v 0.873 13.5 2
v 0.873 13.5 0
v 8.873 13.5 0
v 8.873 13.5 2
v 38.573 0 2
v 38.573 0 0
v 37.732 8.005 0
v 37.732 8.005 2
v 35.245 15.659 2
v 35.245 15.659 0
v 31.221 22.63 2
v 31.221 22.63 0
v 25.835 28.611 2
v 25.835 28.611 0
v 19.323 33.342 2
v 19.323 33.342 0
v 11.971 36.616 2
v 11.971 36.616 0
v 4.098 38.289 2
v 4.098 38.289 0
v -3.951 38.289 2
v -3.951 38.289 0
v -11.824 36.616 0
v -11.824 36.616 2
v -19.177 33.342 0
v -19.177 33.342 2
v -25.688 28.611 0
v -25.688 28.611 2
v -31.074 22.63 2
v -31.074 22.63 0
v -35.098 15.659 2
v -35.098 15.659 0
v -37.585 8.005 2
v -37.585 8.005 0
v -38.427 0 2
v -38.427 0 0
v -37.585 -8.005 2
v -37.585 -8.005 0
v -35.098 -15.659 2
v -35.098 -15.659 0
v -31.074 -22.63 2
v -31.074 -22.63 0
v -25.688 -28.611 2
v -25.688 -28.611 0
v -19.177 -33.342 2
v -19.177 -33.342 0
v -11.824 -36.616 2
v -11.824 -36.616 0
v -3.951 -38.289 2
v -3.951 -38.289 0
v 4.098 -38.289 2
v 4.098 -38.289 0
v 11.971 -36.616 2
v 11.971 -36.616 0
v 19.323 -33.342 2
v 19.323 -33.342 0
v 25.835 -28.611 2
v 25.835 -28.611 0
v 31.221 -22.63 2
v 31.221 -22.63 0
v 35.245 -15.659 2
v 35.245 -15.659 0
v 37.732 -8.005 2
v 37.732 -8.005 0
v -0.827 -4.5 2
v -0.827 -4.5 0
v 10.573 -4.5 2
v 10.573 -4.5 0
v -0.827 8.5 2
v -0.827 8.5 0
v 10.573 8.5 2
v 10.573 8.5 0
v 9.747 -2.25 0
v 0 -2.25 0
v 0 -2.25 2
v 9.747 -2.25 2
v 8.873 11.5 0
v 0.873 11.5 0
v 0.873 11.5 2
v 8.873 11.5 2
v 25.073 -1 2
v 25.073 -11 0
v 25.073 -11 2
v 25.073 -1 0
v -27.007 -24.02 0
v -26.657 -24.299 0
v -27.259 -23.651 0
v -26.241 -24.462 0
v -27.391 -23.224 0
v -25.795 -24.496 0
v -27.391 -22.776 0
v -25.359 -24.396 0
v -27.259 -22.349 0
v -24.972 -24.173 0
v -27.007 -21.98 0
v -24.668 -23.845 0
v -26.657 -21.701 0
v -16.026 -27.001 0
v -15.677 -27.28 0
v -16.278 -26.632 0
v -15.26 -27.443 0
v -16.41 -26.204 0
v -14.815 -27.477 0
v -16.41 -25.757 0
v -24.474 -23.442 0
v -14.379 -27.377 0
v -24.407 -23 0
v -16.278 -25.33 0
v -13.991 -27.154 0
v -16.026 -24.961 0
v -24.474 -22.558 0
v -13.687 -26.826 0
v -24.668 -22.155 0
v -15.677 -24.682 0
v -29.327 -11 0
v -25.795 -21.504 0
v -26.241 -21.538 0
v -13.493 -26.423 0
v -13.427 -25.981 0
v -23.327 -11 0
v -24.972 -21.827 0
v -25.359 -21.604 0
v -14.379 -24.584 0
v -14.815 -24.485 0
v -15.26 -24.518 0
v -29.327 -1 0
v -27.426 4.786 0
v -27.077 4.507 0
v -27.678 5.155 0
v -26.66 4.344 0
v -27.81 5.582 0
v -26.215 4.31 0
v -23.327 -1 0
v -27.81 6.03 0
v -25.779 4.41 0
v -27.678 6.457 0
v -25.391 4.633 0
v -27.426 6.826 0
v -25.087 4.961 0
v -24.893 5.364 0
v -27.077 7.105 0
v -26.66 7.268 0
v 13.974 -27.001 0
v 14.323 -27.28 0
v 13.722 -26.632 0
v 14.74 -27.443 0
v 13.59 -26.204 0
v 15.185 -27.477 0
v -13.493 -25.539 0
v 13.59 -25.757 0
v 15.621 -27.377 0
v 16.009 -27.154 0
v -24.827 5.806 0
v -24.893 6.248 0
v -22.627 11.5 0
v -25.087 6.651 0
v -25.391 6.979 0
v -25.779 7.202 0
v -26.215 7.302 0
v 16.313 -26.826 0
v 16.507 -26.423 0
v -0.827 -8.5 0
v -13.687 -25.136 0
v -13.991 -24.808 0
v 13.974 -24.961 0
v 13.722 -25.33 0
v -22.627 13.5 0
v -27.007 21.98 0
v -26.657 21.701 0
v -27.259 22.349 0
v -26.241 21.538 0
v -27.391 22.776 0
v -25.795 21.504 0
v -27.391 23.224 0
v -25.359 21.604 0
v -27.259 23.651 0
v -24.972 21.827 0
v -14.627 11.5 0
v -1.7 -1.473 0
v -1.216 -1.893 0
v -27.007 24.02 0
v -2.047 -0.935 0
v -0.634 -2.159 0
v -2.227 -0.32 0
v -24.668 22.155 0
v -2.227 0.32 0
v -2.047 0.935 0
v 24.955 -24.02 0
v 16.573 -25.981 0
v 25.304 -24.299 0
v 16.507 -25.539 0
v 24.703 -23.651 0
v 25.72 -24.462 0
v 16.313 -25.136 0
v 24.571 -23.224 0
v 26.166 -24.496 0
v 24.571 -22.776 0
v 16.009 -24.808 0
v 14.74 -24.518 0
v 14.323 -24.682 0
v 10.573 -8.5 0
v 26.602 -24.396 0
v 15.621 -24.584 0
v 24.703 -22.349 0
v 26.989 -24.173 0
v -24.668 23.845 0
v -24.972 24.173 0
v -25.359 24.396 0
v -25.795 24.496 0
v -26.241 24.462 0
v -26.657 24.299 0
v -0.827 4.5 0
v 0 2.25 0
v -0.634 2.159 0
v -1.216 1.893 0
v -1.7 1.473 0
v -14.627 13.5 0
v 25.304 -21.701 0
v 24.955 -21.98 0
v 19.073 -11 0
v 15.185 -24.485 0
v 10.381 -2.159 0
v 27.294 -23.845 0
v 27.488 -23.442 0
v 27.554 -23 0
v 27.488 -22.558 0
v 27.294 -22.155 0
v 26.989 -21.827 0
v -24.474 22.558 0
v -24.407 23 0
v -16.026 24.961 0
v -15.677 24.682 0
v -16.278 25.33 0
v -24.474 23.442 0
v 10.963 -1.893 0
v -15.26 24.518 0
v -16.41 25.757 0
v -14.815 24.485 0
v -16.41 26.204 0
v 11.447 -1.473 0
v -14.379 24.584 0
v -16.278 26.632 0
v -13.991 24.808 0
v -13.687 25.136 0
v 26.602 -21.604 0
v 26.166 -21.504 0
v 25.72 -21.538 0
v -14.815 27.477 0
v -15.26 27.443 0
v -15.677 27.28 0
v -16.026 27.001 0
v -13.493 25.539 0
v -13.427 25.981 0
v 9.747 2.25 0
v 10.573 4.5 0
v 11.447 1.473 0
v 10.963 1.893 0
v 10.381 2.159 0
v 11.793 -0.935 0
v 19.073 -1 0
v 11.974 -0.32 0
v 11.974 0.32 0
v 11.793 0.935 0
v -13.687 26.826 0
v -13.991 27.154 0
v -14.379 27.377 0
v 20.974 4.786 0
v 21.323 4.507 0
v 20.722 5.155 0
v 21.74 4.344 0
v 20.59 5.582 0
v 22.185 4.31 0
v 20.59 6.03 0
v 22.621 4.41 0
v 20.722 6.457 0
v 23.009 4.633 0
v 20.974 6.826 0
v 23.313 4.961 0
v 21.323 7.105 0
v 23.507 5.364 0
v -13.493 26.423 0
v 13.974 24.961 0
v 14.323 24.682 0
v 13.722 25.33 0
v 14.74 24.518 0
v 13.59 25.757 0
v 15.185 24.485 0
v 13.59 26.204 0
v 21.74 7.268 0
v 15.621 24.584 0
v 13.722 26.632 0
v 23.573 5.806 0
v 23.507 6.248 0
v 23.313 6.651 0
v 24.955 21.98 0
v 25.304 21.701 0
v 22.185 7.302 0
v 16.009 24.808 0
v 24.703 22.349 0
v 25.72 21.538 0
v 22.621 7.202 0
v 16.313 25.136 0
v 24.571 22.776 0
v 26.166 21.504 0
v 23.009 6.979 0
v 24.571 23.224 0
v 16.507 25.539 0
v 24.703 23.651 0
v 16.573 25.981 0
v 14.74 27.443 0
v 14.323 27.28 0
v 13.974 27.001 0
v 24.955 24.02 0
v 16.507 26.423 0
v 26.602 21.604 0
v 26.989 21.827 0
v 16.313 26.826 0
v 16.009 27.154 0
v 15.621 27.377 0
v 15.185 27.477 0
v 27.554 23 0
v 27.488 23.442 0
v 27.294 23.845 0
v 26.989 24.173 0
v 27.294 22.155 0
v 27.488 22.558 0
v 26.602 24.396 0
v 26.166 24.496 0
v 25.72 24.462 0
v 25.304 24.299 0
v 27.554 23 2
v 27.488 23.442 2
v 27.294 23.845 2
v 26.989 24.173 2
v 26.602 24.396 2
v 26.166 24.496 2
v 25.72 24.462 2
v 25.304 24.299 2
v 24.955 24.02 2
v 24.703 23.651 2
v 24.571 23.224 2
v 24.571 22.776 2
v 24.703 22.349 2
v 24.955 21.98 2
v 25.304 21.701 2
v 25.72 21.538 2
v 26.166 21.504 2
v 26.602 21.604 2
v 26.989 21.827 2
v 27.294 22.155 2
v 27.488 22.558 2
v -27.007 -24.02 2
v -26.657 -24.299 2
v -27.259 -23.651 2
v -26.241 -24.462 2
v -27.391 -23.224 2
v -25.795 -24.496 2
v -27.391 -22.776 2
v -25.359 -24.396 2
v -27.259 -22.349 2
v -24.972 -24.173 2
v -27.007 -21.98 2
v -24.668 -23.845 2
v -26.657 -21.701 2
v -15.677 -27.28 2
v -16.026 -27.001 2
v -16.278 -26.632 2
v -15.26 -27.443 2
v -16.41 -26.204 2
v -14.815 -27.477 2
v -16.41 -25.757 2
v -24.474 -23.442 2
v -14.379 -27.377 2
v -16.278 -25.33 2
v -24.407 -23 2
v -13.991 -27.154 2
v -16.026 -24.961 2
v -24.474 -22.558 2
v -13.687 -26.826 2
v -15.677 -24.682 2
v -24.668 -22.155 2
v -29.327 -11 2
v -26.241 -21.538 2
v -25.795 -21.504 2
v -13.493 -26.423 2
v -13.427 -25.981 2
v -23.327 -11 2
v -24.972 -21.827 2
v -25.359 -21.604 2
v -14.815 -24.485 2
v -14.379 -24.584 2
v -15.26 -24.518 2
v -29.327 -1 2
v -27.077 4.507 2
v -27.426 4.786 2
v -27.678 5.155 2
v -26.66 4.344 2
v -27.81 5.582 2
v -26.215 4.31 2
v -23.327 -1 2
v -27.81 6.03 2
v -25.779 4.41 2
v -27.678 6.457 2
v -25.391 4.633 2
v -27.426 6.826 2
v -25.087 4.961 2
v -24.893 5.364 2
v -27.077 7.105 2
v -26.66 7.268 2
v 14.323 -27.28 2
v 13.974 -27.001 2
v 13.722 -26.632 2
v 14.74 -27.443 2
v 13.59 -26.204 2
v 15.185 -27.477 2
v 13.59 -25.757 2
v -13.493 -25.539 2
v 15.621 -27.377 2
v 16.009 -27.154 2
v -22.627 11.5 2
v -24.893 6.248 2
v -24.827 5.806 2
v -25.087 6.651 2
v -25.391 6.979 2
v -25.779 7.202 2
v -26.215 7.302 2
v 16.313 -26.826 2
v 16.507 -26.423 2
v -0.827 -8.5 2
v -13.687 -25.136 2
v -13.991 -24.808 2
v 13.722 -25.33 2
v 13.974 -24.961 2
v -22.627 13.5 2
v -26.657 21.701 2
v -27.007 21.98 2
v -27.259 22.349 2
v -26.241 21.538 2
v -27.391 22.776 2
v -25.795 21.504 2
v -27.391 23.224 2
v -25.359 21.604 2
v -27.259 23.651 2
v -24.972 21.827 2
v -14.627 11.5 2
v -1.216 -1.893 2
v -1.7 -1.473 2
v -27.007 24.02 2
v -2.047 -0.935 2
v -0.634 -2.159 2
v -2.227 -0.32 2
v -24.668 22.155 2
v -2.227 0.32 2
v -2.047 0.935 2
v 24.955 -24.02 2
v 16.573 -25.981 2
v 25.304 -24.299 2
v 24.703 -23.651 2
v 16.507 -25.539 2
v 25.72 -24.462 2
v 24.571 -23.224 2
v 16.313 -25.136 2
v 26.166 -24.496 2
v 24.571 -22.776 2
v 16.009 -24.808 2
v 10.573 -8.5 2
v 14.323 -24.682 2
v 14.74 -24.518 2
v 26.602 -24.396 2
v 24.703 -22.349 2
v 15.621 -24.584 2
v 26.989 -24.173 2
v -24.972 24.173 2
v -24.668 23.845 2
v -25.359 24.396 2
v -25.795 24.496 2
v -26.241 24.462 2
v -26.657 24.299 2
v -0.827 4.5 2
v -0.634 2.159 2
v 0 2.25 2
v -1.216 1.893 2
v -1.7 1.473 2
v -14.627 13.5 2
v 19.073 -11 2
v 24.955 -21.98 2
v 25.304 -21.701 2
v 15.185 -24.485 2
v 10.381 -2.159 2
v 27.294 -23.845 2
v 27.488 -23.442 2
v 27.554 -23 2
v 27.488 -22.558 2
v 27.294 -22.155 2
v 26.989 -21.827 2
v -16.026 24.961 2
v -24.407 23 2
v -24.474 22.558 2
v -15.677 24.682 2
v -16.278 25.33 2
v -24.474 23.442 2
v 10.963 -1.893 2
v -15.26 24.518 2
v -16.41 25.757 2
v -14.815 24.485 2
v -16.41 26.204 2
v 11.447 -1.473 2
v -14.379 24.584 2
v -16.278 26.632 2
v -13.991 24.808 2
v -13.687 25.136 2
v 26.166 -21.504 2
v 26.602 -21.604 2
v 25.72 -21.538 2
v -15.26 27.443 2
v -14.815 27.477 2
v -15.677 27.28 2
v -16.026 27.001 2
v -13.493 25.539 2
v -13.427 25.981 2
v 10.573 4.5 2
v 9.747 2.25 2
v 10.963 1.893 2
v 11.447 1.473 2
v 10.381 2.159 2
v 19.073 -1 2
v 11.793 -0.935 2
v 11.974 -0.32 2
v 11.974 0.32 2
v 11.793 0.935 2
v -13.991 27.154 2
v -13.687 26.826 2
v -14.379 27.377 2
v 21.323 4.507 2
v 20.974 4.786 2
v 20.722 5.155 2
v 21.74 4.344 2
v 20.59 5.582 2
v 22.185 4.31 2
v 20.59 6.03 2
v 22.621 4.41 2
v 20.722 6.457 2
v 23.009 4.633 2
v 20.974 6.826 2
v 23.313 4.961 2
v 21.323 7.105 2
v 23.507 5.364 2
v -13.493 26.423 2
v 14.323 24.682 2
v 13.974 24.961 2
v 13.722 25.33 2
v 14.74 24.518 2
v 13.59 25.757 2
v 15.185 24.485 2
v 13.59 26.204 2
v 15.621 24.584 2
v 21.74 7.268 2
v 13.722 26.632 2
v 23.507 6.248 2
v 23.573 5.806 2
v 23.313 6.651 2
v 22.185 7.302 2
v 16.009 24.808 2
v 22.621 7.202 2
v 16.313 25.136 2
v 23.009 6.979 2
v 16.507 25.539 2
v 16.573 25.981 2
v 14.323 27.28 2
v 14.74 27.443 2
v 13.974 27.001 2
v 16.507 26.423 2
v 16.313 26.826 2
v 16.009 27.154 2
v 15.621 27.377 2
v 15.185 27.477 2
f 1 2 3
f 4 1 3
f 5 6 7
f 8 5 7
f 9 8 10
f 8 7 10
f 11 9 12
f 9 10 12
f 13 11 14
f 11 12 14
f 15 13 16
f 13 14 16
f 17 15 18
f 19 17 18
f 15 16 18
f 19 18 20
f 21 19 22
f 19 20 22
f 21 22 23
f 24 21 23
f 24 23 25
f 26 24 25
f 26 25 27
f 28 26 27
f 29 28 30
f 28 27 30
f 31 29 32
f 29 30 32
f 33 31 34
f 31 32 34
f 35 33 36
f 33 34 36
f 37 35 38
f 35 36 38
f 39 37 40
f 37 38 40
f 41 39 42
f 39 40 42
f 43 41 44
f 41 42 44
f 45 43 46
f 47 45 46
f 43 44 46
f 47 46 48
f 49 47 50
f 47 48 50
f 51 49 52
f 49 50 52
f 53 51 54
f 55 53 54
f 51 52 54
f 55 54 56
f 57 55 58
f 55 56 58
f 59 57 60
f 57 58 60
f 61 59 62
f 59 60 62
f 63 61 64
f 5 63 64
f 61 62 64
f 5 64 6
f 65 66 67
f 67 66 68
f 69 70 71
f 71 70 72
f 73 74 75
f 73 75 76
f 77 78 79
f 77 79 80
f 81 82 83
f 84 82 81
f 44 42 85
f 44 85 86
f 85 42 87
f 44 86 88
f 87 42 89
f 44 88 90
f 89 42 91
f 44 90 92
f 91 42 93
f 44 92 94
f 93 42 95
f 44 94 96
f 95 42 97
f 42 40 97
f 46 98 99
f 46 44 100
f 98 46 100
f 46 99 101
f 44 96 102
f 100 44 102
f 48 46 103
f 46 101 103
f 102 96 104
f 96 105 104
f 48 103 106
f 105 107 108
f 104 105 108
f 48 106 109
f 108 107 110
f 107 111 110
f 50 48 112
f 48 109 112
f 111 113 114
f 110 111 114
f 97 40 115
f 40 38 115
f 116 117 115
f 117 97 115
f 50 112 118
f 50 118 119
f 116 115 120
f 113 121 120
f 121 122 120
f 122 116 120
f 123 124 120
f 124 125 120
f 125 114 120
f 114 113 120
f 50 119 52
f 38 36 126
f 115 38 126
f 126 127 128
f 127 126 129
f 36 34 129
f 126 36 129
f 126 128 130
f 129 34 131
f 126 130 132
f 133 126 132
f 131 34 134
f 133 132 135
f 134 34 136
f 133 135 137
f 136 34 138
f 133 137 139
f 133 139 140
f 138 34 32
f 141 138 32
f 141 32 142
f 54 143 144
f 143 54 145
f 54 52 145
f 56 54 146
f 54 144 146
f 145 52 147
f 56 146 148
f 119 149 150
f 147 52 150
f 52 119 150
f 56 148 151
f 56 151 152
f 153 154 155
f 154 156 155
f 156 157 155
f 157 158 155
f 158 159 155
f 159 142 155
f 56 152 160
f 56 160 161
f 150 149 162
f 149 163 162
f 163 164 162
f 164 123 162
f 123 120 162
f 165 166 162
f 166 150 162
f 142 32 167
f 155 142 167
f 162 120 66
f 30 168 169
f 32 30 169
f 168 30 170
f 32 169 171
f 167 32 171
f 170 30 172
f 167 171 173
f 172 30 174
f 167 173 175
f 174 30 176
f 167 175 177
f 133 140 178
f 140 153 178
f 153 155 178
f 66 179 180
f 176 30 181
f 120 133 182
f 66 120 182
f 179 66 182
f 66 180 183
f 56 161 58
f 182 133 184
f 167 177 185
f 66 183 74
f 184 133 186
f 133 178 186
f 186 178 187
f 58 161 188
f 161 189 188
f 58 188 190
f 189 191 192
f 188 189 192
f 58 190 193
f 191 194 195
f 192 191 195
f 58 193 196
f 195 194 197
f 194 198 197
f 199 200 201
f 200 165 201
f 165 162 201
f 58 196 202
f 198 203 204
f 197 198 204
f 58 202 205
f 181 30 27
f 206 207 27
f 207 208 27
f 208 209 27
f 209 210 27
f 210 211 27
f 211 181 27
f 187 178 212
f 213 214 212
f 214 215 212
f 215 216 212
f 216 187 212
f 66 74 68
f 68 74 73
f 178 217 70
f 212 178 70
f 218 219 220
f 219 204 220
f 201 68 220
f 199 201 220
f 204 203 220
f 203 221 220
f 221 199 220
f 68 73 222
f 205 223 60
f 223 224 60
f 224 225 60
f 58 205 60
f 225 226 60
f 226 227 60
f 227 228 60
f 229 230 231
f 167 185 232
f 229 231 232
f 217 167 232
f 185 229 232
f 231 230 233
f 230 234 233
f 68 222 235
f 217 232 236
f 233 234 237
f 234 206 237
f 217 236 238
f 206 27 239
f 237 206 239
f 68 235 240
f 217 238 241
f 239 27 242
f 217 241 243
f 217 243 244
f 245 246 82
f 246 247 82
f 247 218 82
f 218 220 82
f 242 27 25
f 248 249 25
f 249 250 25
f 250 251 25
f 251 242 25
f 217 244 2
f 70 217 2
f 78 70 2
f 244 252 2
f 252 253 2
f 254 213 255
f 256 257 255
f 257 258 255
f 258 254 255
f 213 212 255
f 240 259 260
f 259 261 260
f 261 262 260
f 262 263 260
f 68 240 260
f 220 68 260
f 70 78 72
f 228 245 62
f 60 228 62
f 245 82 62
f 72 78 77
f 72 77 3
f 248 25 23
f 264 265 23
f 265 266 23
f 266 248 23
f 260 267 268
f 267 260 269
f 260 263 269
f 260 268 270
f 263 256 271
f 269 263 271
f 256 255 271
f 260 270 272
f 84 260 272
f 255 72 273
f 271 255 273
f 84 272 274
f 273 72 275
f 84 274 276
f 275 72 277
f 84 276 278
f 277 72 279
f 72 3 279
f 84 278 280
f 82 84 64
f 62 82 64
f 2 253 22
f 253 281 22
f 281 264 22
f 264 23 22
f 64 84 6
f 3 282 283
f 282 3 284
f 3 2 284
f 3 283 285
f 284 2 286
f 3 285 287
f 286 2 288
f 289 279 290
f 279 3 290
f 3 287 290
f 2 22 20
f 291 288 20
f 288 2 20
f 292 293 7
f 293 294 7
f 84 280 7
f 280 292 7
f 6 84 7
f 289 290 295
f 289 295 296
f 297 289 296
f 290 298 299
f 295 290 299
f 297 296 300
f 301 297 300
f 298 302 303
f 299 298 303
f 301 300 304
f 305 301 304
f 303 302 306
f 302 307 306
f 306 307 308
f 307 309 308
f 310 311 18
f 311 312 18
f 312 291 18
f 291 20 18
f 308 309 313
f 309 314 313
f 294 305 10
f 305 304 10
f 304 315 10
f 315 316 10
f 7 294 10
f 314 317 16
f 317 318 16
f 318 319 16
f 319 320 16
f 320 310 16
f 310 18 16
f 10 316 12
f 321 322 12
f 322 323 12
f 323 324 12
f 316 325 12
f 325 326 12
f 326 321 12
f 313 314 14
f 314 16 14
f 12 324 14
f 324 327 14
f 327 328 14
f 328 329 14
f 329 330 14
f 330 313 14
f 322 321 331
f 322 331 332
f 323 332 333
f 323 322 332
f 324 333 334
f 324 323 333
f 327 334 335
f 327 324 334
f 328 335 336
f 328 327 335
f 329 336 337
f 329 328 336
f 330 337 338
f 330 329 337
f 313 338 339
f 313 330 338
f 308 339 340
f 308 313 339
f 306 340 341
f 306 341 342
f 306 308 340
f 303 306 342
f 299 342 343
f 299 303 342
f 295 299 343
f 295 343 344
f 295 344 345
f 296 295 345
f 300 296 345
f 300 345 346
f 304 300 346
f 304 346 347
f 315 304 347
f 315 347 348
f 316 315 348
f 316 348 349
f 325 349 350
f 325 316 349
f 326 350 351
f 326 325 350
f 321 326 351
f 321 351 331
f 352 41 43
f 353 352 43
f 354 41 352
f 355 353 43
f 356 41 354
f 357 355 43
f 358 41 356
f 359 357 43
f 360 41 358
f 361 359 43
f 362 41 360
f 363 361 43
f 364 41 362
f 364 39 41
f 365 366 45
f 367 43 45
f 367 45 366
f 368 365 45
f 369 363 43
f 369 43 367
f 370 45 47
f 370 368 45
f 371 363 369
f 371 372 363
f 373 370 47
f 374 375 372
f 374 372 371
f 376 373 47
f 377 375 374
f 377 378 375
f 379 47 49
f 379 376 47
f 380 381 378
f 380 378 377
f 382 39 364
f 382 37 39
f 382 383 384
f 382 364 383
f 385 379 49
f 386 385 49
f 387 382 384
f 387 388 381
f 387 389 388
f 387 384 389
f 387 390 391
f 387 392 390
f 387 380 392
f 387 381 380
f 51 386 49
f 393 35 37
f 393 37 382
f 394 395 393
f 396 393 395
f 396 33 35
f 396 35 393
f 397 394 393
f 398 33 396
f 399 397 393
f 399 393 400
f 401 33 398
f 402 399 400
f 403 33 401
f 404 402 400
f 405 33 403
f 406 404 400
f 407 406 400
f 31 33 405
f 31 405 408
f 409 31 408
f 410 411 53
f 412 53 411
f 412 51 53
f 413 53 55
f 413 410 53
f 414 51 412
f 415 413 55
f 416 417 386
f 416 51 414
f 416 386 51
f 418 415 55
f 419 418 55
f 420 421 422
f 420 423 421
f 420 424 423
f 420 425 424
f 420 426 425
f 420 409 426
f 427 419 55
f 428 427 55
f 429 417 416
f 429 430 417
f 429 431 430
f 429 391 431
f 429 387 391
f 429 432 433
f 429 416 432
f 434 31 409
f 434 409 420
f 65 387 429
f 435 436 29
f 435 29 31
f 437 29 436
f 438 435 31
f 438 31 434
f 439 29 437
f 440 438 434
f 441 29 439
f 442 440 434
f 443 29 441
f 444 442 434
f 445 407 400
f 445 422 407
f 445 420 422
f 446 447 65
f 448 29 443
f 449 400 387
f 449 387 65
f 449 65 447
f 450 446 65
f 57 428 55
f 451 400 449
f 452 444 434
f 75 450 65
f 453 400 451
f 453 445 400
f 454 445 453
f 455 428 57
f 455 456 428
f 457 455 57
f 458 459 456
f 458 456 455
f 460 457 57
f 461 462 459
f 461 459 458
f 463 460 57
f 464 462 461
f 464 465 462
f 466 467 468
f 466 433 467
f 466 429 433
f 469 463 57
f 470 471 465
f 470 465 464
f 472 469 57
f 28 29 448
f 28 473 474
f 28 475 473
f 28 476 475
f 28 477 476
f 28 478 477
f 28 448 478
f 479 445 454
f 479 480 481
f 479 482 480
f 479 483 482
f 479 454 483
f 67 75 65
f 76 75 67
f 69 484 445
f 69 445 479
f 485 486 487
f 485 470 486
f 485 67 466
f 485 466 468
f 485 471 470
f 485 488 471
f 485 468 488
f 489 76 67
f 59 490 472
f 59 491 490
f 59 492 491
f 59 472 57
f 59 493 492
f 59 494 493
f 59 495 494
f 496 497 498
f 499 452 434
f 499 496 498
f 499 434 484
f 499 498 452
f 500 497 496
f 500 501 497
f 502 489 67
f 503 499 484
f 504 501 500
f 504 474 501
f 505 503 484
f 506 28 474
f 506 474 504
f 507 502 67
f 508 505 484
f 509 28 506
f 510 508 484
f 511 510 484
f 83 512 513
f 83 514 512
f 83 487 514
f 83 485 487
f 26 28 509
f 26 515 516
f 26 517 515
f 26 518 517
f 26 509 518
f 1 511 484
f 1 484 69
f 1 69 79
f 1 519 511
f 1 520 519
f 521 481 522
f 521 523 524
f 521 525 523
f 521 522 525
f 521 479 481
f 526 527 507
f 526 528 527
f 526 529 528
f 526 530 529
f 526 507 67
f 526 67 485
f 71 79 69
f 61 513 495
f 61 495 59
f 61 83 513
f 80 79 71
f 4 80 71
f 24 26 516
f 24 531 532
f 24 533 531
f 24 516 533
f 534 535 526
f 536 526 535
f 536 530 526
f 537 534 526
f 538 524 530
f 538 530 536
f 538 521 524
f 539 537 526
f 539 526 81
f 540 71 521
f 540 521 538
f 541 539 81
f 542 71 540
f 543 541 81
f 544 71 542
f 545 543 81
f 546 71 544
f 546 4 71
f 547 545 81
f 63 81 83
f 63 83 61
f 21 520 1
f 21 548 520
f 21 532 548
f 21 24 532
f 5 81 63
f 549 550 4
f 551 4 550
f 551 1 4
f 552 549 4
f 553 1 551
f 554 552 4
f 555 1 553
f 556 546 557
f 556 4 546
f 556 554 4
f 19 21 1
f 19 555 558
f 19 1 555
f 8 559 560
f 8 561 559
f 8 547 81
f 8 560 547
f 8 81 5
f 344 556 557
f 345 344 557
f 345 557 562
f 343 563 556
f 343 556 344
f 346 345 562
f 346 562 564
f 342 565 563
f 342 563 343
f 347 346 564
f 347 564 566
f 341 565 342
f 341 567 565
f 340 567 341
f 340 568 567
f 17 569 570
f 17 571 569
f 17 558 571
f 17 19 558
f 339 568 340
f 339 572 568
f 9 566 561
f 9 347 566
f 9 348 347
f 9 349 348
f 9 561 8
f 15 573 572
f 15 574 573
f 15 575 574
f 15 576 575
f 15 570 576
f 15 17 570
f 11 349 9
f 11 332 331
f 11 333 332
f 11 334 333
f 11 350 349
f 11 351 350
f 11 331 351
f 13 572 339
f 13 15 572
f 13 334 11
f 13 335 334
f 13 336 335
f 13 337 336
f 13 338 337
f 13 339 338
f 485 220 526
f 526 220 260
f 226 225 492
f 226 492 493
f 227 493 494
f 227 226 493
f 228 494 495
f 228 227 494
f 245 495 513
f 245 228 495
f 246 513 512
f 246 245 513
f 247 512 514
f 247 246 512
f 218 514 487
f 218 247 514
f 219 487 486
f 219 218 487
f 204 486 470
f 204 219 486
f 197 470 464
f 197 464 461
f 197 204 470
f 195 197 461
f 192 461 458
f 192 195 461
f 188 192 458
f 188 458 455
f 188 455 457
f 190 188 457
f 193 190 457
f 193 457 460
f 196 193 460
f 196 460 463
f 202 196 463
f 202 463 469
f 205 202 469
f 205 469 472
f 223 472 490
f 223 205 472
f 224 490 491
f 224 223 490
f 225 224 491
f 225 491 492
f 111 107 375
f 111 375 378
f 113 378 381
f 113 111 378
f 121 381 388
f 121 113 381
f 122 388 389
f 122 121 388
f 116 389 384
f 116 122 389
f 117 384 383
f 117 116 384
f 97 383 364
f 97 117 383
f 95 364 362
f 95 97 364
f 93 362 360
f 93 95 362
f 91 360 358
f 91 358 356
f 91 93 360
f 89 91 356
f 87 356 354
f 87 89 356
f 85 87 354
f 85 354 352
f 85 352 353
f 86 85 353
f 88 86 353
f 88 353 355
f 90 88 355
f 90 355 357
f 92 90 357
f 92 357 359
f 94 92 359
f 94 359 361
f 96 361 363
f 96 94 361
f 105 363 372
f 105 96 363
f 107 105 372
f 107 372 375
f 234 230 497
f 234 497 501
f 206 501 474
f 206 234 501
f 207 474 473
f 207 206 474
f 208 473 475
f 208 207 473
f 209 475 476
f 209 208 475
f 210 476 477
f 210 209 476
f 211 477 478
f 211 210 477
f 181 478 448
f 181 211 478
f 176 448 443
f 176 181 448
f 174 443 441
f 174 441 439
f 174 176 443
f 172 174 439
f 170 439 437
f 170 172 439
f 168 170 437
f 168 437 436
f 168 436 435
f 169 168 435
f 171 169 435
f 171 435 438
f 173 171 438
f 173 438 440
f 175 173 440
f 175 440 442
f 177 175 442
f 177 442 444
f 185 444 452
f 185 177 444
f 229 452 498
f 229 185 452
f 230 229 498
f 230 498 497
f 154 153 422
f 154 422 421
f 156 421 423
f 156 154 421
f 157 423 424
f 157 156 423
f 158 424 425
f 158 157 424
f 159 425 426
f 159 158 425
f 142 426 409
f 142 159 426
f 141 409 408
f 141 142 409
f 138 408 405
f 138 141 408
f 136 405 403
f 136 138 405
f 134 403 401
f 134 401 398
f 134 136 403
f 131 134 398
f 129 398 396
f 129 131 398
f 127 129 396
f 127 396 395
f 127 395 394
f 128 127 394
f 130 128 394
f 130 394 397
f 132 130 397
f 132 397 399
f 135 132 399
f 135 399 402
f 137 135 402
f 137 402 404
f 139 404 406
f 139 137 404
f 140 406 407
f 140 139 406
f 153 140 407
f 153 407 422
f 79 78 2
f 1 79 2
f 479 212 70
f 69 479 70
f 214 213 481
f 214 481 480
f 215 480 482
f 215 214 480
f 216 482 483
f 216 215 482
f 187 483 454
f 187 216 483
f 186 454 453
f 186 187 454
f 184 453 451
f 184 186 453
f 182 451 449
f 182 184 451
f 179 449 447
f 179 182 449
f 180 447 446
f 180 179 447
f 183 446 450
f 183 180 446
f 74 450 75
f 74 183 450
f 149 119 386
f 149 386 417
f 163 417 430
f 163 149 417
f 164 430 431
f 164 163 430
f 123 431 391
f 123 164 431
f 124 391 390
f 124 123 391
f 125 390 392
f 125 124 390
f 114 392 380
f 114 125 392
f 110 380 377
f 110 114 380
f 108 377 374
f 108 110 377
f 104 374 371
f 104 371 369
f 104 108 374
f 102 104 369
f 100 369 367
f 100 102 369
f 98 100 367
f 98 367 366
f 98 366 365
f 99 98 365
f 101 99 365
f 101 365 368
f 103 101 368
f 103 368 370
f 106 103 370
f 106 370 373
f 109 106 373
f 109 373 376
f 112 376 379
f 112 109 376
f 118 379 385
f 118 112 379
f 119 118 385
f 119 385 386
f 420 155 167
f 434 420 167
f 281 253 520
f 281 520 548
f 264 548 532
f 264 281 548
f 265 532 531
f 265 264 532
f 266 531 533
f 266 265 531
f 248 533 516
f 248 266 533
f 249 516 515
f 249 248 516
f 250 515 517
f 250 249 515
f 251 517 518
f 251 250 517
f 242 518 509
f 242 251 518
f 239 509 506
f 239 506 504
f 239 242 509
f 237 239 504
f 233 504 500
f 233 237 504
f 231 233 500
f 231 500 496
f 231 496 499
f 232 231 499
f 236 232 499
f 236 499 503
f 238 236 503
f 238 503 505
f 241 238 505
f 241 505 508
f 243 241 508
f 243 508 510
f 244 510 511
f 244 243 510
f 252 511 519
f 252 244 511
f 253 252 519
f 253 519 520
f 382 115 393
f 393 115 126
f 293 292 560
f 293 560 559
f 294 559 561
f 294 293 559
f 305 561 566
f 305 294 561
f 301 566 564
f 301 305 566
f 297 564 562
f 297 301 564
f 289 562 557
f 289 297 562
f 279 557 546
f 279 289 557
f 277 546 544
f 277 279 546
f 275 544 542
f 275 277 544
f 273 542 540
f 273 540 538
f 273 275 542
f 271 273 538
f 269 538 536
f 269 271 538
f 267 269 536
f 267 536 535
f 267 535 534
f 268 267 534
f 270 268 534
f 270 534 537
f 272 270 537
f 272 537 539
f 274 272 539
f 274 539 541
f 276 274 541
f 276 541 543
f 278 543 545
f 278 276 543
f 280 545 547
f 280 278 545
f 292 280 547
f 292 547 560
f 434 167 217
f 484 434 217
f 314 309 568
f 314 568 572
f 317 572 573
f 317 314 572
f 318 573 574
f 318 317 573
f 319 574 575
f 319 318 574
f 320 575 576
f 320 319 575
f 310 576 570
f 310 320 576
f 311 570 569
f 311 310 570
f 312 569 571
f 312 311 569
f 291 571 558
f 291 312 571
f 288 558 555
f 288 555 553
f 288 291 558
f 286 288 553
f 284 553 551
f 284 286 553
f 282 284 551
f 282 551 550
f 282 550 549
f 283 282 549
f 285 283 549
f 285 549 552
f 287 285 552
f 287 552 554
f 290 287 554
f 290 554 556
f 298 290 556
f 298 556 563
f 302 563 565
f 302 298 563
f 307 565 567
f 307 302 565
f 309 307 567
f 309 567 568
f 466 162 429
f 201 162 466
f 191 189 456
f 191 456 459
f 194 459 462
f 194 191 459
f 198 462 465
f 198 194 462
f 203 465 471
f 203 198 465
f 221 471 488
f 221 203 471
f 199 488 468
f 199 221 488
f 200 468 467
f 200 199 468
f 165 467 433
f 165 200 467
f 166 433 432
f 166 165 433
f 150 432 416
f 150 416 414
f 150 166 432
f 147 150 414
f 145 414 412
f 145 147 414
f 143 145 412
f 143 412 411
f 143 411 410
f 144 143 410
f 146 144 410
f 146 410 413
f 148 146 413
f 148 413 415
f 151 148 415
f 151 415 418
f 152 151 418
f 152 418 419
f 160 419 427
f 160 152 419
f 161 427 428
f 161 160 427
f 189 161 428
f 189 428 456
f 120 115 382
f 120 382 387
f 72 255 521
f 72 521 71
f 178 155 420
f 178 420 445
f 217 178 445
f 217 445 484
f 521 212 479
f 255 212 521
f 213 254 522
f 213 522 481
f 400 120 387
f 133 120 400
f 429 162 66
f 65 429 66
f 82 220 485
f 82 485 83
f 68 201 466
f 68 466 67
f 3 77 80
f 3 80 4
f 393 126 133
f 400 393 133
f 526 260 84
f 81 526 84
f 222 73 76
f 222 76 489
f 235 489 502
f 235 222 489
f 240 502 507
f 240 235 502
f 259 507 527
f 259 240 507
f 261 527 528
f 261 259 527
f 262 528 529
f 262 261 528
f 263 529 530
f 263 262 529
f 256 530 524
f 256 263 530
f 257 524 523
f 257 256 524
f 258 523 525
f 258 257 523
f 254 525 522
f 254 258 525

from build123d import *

# Parameters (mm, degrees)
MODEL_R             = 38.5
MODEL_R_2           = 1.5
MODEL_W             = 8
MODEL_H             = 2
MODEL_W_2           = 11.4
MODEL_H_2           = 4
MODEL_W_3           = 6
MODEL_H_3           = 10
BOSS_EXTRUDE1_DEPTH = 2


with BuildPart() as part:
    # Model → Boss-Extrude1 (new body)
    with BuildSketch(Plane.XY):
        with Locations((0.073397172, 0)):
            Circle(MODEL_R)
        with Locations((-14.926602828, -25.980762114)):
            Circle(MODEL_R_2, mode=Mode.SUBTRACT)
        with Locations((-14.926602828, 25.980762114)):
            Circle(MODEL_R_2, mode=Mode.SUBTRACT)
        with Locations((15.073397172, 25.980762114)):
            Circle(MODEL_R_2, mode=Mode.SUBTRACT)
        with Locations((15.073397172, -25.980762114)):
            Circle(MODEL_R_2, mode=Mode.SUBTRACT)
        with Locations((-26.326602828, 5.806018336)):
            Circle(MODEL_R_2, mode=Mode.SUBTRACT)
        with Locations((22.073397172, 5.806018336)):
            Circle(MODEL_R_2, mode=Mode.SUBTRACT)
        with Locations((26.054159286, -23)):
            Circle(MODEL_R_2, mode=Mode.SUBTRACT)
        with Locations((-25.907364941, -23)):
            Circle(MODEL_R_2, mode=Mode.SUBTRACT)
        with Locations((26.054159286, 23)):
            Circle(MODEL_R_2, mode=Mode.SUBTRACT)
        with Locations((-25.907364941, 23)):
            Circle(MODEL_R_2, mode=Mode.SUBTRACT)
        with Locations((-18.626602828, 12.5)):
            Rectangle(MODEL_W, MODEL_H, mode=Mode.SUBTRACT)
        with Locations((4.873397172, 12.5)):
            Rectangle(MODEL_W, MODEL_H, mode=Mode.SUBTRACT)
        with Locations((4.873397172, -6.5)):
            Rectangle(MODEL_W_2, MODEL_H_2, mode=Mode.SUBTRACT)
        with Locations((4.873397172, 6.5)):
            Rectangle(MODEL_W_2, MODEL_H_2, mode=Mode.SUBTRACT)
        with BuildLine():
            Line((0, -2.25), (9.746794345, -2.25))
            ThreePointArc((9.746794345, -2.25), (11.996794345, 0), (9.746794345, 2.25))
            Line((9.746794345, 2.25), (0, 2.25))
            ThreePointArc((0, 2.25), (-2.25, 0), (0, -2.25))
        make_face(mode=Mode.SUBTRACT)
        with Locations((-26.326602828, -6)):
            Rectangle(MODEL_W_3, MODEL_H_3, mode=Mode.SUBTRACT)
        with Locations((22.073397172, -6)):
            Rectangle(MODEL_W_3, MODEL_H_3, mode=Mode.SUBTRACT)
    extrude(amount=BOSS_EXTRUDE1_DEPTH)


solid = part.part
